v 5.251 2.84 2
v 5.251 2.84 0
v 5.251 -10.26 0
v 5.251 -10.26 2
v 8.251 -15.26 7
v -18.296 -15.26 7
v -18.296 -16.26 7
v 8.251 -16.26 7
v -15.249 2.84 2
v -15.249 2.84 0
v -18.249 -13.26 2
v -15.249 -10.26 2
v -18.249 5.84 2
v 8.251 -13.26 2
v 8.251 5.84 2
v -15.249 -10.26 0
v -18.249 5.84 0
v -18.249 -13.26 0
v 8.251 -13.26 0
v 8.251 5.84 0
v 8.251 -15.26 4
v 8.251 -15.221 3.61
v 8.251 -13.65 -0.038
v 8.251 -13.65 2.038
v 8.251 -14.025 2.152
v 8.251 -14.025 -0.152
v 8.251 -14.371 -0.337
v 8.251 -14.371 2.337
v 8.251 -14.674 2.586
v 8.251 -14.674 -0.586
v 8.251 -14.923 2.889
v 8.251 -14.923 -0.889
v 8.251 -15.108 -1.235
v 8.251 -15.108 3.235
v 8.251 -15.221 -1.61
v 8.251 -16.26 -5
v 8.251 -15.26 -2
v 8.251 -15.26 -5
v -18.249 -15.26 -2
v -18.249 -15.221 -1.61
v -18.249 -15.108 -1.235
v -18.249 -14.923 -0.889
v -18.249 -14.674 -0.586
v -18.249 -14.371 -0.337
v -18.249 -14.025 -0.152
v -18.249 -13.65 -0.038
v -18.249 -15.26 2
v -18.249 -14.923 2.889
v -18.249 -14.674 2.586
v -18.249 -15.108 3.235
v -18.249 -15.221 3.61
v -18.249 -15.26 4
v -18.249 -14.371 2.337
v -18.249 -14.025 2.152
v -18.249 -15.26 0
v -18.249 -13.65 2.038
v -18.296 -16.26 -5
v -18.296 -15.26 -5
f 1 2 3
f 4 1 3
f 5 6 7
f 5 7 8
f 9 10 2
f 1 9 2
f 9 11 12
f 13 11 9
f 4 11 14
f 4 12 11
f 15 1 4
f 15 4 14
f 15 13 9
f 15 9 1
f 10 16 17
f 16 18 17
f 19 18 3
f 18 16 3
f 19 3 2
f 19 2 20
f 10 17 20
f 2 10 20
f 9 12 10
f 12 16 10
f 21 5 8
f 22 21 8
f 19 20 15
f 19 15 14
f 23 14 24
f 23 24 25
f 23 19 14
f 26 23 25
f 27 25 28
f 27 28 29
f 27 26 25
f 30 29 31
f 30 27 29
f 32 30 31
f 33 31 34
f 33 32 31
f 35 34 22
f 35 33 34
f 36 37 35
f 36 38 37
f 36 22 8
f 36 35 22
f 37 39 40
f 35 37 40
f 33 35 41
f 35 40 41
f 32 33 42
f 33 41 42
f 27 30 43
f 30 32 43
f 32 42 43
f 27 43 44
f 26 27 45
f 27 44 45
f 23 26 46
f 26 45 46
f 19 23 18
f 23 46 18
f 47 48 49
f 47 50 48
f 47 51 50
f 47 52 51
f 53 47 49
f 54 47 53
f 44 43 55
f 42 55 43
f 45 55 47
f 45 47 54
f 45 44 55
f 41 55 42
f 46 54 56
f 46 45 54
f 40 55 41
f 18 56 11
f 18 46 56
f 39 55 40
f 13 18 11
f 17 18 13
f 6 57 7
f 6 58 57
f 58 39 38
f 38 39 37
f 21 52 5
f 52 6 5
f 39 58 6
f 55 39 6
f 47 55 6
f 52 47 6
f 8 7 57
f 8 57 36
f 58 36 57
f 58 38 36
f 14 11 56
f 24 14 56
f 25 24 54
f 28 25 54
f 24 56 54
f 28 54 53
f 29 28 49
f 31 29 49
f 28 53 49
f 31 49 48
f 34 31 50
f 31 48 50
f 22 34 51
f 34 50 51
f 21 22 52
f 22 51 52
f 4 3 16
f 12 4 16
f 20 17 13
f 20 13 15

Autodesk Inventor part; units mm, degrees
ref_plane "YZ Plane" through (0, 0, 0) normal (1, 0, 0) x (0, 1, 0)
ref_plane "XZ Plane" through (0, 0, 0) normal (0, 1, 0) x (-1, 0, 0)
ref_plane "XY Plane" through (0, 0, 0) normal (0, 0, 1) x (1, 0, 0)
sketch "Sketch1" plane through (0, 0, 0) normal (0, 0, 1) x (1, 0, 0)
  line L0 (-18.249, 5.8402) -> (8.251, 5.8402)
  line L1 (8.251, 5.8402) -> (8.251, -15.2598)
  line L2 (8.251, -15.2598) -> (-18.249, -15.2598)
  line L3 (-18.249, -15.2598) -> (-18.249, 5.8402)
  line L4 (-15.249, 2.8402) -> (5.251, 2.8402)
  line L5 (5.251, 2.8402) -> (5.251, -10.2598)
  line L6 (5.251, -10.2598) -> (-15.249, -10.2598)
  line L7 (-15.249, -10.2598) -> (-15.249, 2.8402)
  point P0 (0, 0)
  dimension "d0" = 20.5
  dimension "d1" = 13.1
  dimension "d2" = 3
  dimension "d3" = 3
  dimension "d4" = 5
  dimension "d5" = 3
extrude "Extrusion1" add sketch "Sketch1" along normal blind 2
sketch "Sketch2" plane through (-18.249, -15.2598, 0) normal (0, -1, 0) x (1, 0, 0)
  line L0 (-0.0474, 7) -> (26.5, 7)
  line L1 (26.5, 7) -> (26.5, -5)
  line L2 (26.5, -5) -> (-0.0474, -5)
  line L3 (-0.0474, -5) -> (-0.0474, 7)
  line L4 (0, 2) -> (26.5, 2) projected
  line L5 (26.5, 0) -> (0, 0) projected
  line L6 (26.5, 0) -> (26.5, 2) projected
  point P0 (18.249, 0)
  dimension "d8" = 5
  dimension "d9" = 5
  dimension "d10" = 0
extrude "Extrusion2" add sketch "Sketch2" along normal blind 1
fillet "Fillet1" radius 2 2 edges at (-4.999, -15.2598, 2) (-4.999, -15.2598, 0)
properties part number "switch mount test"
